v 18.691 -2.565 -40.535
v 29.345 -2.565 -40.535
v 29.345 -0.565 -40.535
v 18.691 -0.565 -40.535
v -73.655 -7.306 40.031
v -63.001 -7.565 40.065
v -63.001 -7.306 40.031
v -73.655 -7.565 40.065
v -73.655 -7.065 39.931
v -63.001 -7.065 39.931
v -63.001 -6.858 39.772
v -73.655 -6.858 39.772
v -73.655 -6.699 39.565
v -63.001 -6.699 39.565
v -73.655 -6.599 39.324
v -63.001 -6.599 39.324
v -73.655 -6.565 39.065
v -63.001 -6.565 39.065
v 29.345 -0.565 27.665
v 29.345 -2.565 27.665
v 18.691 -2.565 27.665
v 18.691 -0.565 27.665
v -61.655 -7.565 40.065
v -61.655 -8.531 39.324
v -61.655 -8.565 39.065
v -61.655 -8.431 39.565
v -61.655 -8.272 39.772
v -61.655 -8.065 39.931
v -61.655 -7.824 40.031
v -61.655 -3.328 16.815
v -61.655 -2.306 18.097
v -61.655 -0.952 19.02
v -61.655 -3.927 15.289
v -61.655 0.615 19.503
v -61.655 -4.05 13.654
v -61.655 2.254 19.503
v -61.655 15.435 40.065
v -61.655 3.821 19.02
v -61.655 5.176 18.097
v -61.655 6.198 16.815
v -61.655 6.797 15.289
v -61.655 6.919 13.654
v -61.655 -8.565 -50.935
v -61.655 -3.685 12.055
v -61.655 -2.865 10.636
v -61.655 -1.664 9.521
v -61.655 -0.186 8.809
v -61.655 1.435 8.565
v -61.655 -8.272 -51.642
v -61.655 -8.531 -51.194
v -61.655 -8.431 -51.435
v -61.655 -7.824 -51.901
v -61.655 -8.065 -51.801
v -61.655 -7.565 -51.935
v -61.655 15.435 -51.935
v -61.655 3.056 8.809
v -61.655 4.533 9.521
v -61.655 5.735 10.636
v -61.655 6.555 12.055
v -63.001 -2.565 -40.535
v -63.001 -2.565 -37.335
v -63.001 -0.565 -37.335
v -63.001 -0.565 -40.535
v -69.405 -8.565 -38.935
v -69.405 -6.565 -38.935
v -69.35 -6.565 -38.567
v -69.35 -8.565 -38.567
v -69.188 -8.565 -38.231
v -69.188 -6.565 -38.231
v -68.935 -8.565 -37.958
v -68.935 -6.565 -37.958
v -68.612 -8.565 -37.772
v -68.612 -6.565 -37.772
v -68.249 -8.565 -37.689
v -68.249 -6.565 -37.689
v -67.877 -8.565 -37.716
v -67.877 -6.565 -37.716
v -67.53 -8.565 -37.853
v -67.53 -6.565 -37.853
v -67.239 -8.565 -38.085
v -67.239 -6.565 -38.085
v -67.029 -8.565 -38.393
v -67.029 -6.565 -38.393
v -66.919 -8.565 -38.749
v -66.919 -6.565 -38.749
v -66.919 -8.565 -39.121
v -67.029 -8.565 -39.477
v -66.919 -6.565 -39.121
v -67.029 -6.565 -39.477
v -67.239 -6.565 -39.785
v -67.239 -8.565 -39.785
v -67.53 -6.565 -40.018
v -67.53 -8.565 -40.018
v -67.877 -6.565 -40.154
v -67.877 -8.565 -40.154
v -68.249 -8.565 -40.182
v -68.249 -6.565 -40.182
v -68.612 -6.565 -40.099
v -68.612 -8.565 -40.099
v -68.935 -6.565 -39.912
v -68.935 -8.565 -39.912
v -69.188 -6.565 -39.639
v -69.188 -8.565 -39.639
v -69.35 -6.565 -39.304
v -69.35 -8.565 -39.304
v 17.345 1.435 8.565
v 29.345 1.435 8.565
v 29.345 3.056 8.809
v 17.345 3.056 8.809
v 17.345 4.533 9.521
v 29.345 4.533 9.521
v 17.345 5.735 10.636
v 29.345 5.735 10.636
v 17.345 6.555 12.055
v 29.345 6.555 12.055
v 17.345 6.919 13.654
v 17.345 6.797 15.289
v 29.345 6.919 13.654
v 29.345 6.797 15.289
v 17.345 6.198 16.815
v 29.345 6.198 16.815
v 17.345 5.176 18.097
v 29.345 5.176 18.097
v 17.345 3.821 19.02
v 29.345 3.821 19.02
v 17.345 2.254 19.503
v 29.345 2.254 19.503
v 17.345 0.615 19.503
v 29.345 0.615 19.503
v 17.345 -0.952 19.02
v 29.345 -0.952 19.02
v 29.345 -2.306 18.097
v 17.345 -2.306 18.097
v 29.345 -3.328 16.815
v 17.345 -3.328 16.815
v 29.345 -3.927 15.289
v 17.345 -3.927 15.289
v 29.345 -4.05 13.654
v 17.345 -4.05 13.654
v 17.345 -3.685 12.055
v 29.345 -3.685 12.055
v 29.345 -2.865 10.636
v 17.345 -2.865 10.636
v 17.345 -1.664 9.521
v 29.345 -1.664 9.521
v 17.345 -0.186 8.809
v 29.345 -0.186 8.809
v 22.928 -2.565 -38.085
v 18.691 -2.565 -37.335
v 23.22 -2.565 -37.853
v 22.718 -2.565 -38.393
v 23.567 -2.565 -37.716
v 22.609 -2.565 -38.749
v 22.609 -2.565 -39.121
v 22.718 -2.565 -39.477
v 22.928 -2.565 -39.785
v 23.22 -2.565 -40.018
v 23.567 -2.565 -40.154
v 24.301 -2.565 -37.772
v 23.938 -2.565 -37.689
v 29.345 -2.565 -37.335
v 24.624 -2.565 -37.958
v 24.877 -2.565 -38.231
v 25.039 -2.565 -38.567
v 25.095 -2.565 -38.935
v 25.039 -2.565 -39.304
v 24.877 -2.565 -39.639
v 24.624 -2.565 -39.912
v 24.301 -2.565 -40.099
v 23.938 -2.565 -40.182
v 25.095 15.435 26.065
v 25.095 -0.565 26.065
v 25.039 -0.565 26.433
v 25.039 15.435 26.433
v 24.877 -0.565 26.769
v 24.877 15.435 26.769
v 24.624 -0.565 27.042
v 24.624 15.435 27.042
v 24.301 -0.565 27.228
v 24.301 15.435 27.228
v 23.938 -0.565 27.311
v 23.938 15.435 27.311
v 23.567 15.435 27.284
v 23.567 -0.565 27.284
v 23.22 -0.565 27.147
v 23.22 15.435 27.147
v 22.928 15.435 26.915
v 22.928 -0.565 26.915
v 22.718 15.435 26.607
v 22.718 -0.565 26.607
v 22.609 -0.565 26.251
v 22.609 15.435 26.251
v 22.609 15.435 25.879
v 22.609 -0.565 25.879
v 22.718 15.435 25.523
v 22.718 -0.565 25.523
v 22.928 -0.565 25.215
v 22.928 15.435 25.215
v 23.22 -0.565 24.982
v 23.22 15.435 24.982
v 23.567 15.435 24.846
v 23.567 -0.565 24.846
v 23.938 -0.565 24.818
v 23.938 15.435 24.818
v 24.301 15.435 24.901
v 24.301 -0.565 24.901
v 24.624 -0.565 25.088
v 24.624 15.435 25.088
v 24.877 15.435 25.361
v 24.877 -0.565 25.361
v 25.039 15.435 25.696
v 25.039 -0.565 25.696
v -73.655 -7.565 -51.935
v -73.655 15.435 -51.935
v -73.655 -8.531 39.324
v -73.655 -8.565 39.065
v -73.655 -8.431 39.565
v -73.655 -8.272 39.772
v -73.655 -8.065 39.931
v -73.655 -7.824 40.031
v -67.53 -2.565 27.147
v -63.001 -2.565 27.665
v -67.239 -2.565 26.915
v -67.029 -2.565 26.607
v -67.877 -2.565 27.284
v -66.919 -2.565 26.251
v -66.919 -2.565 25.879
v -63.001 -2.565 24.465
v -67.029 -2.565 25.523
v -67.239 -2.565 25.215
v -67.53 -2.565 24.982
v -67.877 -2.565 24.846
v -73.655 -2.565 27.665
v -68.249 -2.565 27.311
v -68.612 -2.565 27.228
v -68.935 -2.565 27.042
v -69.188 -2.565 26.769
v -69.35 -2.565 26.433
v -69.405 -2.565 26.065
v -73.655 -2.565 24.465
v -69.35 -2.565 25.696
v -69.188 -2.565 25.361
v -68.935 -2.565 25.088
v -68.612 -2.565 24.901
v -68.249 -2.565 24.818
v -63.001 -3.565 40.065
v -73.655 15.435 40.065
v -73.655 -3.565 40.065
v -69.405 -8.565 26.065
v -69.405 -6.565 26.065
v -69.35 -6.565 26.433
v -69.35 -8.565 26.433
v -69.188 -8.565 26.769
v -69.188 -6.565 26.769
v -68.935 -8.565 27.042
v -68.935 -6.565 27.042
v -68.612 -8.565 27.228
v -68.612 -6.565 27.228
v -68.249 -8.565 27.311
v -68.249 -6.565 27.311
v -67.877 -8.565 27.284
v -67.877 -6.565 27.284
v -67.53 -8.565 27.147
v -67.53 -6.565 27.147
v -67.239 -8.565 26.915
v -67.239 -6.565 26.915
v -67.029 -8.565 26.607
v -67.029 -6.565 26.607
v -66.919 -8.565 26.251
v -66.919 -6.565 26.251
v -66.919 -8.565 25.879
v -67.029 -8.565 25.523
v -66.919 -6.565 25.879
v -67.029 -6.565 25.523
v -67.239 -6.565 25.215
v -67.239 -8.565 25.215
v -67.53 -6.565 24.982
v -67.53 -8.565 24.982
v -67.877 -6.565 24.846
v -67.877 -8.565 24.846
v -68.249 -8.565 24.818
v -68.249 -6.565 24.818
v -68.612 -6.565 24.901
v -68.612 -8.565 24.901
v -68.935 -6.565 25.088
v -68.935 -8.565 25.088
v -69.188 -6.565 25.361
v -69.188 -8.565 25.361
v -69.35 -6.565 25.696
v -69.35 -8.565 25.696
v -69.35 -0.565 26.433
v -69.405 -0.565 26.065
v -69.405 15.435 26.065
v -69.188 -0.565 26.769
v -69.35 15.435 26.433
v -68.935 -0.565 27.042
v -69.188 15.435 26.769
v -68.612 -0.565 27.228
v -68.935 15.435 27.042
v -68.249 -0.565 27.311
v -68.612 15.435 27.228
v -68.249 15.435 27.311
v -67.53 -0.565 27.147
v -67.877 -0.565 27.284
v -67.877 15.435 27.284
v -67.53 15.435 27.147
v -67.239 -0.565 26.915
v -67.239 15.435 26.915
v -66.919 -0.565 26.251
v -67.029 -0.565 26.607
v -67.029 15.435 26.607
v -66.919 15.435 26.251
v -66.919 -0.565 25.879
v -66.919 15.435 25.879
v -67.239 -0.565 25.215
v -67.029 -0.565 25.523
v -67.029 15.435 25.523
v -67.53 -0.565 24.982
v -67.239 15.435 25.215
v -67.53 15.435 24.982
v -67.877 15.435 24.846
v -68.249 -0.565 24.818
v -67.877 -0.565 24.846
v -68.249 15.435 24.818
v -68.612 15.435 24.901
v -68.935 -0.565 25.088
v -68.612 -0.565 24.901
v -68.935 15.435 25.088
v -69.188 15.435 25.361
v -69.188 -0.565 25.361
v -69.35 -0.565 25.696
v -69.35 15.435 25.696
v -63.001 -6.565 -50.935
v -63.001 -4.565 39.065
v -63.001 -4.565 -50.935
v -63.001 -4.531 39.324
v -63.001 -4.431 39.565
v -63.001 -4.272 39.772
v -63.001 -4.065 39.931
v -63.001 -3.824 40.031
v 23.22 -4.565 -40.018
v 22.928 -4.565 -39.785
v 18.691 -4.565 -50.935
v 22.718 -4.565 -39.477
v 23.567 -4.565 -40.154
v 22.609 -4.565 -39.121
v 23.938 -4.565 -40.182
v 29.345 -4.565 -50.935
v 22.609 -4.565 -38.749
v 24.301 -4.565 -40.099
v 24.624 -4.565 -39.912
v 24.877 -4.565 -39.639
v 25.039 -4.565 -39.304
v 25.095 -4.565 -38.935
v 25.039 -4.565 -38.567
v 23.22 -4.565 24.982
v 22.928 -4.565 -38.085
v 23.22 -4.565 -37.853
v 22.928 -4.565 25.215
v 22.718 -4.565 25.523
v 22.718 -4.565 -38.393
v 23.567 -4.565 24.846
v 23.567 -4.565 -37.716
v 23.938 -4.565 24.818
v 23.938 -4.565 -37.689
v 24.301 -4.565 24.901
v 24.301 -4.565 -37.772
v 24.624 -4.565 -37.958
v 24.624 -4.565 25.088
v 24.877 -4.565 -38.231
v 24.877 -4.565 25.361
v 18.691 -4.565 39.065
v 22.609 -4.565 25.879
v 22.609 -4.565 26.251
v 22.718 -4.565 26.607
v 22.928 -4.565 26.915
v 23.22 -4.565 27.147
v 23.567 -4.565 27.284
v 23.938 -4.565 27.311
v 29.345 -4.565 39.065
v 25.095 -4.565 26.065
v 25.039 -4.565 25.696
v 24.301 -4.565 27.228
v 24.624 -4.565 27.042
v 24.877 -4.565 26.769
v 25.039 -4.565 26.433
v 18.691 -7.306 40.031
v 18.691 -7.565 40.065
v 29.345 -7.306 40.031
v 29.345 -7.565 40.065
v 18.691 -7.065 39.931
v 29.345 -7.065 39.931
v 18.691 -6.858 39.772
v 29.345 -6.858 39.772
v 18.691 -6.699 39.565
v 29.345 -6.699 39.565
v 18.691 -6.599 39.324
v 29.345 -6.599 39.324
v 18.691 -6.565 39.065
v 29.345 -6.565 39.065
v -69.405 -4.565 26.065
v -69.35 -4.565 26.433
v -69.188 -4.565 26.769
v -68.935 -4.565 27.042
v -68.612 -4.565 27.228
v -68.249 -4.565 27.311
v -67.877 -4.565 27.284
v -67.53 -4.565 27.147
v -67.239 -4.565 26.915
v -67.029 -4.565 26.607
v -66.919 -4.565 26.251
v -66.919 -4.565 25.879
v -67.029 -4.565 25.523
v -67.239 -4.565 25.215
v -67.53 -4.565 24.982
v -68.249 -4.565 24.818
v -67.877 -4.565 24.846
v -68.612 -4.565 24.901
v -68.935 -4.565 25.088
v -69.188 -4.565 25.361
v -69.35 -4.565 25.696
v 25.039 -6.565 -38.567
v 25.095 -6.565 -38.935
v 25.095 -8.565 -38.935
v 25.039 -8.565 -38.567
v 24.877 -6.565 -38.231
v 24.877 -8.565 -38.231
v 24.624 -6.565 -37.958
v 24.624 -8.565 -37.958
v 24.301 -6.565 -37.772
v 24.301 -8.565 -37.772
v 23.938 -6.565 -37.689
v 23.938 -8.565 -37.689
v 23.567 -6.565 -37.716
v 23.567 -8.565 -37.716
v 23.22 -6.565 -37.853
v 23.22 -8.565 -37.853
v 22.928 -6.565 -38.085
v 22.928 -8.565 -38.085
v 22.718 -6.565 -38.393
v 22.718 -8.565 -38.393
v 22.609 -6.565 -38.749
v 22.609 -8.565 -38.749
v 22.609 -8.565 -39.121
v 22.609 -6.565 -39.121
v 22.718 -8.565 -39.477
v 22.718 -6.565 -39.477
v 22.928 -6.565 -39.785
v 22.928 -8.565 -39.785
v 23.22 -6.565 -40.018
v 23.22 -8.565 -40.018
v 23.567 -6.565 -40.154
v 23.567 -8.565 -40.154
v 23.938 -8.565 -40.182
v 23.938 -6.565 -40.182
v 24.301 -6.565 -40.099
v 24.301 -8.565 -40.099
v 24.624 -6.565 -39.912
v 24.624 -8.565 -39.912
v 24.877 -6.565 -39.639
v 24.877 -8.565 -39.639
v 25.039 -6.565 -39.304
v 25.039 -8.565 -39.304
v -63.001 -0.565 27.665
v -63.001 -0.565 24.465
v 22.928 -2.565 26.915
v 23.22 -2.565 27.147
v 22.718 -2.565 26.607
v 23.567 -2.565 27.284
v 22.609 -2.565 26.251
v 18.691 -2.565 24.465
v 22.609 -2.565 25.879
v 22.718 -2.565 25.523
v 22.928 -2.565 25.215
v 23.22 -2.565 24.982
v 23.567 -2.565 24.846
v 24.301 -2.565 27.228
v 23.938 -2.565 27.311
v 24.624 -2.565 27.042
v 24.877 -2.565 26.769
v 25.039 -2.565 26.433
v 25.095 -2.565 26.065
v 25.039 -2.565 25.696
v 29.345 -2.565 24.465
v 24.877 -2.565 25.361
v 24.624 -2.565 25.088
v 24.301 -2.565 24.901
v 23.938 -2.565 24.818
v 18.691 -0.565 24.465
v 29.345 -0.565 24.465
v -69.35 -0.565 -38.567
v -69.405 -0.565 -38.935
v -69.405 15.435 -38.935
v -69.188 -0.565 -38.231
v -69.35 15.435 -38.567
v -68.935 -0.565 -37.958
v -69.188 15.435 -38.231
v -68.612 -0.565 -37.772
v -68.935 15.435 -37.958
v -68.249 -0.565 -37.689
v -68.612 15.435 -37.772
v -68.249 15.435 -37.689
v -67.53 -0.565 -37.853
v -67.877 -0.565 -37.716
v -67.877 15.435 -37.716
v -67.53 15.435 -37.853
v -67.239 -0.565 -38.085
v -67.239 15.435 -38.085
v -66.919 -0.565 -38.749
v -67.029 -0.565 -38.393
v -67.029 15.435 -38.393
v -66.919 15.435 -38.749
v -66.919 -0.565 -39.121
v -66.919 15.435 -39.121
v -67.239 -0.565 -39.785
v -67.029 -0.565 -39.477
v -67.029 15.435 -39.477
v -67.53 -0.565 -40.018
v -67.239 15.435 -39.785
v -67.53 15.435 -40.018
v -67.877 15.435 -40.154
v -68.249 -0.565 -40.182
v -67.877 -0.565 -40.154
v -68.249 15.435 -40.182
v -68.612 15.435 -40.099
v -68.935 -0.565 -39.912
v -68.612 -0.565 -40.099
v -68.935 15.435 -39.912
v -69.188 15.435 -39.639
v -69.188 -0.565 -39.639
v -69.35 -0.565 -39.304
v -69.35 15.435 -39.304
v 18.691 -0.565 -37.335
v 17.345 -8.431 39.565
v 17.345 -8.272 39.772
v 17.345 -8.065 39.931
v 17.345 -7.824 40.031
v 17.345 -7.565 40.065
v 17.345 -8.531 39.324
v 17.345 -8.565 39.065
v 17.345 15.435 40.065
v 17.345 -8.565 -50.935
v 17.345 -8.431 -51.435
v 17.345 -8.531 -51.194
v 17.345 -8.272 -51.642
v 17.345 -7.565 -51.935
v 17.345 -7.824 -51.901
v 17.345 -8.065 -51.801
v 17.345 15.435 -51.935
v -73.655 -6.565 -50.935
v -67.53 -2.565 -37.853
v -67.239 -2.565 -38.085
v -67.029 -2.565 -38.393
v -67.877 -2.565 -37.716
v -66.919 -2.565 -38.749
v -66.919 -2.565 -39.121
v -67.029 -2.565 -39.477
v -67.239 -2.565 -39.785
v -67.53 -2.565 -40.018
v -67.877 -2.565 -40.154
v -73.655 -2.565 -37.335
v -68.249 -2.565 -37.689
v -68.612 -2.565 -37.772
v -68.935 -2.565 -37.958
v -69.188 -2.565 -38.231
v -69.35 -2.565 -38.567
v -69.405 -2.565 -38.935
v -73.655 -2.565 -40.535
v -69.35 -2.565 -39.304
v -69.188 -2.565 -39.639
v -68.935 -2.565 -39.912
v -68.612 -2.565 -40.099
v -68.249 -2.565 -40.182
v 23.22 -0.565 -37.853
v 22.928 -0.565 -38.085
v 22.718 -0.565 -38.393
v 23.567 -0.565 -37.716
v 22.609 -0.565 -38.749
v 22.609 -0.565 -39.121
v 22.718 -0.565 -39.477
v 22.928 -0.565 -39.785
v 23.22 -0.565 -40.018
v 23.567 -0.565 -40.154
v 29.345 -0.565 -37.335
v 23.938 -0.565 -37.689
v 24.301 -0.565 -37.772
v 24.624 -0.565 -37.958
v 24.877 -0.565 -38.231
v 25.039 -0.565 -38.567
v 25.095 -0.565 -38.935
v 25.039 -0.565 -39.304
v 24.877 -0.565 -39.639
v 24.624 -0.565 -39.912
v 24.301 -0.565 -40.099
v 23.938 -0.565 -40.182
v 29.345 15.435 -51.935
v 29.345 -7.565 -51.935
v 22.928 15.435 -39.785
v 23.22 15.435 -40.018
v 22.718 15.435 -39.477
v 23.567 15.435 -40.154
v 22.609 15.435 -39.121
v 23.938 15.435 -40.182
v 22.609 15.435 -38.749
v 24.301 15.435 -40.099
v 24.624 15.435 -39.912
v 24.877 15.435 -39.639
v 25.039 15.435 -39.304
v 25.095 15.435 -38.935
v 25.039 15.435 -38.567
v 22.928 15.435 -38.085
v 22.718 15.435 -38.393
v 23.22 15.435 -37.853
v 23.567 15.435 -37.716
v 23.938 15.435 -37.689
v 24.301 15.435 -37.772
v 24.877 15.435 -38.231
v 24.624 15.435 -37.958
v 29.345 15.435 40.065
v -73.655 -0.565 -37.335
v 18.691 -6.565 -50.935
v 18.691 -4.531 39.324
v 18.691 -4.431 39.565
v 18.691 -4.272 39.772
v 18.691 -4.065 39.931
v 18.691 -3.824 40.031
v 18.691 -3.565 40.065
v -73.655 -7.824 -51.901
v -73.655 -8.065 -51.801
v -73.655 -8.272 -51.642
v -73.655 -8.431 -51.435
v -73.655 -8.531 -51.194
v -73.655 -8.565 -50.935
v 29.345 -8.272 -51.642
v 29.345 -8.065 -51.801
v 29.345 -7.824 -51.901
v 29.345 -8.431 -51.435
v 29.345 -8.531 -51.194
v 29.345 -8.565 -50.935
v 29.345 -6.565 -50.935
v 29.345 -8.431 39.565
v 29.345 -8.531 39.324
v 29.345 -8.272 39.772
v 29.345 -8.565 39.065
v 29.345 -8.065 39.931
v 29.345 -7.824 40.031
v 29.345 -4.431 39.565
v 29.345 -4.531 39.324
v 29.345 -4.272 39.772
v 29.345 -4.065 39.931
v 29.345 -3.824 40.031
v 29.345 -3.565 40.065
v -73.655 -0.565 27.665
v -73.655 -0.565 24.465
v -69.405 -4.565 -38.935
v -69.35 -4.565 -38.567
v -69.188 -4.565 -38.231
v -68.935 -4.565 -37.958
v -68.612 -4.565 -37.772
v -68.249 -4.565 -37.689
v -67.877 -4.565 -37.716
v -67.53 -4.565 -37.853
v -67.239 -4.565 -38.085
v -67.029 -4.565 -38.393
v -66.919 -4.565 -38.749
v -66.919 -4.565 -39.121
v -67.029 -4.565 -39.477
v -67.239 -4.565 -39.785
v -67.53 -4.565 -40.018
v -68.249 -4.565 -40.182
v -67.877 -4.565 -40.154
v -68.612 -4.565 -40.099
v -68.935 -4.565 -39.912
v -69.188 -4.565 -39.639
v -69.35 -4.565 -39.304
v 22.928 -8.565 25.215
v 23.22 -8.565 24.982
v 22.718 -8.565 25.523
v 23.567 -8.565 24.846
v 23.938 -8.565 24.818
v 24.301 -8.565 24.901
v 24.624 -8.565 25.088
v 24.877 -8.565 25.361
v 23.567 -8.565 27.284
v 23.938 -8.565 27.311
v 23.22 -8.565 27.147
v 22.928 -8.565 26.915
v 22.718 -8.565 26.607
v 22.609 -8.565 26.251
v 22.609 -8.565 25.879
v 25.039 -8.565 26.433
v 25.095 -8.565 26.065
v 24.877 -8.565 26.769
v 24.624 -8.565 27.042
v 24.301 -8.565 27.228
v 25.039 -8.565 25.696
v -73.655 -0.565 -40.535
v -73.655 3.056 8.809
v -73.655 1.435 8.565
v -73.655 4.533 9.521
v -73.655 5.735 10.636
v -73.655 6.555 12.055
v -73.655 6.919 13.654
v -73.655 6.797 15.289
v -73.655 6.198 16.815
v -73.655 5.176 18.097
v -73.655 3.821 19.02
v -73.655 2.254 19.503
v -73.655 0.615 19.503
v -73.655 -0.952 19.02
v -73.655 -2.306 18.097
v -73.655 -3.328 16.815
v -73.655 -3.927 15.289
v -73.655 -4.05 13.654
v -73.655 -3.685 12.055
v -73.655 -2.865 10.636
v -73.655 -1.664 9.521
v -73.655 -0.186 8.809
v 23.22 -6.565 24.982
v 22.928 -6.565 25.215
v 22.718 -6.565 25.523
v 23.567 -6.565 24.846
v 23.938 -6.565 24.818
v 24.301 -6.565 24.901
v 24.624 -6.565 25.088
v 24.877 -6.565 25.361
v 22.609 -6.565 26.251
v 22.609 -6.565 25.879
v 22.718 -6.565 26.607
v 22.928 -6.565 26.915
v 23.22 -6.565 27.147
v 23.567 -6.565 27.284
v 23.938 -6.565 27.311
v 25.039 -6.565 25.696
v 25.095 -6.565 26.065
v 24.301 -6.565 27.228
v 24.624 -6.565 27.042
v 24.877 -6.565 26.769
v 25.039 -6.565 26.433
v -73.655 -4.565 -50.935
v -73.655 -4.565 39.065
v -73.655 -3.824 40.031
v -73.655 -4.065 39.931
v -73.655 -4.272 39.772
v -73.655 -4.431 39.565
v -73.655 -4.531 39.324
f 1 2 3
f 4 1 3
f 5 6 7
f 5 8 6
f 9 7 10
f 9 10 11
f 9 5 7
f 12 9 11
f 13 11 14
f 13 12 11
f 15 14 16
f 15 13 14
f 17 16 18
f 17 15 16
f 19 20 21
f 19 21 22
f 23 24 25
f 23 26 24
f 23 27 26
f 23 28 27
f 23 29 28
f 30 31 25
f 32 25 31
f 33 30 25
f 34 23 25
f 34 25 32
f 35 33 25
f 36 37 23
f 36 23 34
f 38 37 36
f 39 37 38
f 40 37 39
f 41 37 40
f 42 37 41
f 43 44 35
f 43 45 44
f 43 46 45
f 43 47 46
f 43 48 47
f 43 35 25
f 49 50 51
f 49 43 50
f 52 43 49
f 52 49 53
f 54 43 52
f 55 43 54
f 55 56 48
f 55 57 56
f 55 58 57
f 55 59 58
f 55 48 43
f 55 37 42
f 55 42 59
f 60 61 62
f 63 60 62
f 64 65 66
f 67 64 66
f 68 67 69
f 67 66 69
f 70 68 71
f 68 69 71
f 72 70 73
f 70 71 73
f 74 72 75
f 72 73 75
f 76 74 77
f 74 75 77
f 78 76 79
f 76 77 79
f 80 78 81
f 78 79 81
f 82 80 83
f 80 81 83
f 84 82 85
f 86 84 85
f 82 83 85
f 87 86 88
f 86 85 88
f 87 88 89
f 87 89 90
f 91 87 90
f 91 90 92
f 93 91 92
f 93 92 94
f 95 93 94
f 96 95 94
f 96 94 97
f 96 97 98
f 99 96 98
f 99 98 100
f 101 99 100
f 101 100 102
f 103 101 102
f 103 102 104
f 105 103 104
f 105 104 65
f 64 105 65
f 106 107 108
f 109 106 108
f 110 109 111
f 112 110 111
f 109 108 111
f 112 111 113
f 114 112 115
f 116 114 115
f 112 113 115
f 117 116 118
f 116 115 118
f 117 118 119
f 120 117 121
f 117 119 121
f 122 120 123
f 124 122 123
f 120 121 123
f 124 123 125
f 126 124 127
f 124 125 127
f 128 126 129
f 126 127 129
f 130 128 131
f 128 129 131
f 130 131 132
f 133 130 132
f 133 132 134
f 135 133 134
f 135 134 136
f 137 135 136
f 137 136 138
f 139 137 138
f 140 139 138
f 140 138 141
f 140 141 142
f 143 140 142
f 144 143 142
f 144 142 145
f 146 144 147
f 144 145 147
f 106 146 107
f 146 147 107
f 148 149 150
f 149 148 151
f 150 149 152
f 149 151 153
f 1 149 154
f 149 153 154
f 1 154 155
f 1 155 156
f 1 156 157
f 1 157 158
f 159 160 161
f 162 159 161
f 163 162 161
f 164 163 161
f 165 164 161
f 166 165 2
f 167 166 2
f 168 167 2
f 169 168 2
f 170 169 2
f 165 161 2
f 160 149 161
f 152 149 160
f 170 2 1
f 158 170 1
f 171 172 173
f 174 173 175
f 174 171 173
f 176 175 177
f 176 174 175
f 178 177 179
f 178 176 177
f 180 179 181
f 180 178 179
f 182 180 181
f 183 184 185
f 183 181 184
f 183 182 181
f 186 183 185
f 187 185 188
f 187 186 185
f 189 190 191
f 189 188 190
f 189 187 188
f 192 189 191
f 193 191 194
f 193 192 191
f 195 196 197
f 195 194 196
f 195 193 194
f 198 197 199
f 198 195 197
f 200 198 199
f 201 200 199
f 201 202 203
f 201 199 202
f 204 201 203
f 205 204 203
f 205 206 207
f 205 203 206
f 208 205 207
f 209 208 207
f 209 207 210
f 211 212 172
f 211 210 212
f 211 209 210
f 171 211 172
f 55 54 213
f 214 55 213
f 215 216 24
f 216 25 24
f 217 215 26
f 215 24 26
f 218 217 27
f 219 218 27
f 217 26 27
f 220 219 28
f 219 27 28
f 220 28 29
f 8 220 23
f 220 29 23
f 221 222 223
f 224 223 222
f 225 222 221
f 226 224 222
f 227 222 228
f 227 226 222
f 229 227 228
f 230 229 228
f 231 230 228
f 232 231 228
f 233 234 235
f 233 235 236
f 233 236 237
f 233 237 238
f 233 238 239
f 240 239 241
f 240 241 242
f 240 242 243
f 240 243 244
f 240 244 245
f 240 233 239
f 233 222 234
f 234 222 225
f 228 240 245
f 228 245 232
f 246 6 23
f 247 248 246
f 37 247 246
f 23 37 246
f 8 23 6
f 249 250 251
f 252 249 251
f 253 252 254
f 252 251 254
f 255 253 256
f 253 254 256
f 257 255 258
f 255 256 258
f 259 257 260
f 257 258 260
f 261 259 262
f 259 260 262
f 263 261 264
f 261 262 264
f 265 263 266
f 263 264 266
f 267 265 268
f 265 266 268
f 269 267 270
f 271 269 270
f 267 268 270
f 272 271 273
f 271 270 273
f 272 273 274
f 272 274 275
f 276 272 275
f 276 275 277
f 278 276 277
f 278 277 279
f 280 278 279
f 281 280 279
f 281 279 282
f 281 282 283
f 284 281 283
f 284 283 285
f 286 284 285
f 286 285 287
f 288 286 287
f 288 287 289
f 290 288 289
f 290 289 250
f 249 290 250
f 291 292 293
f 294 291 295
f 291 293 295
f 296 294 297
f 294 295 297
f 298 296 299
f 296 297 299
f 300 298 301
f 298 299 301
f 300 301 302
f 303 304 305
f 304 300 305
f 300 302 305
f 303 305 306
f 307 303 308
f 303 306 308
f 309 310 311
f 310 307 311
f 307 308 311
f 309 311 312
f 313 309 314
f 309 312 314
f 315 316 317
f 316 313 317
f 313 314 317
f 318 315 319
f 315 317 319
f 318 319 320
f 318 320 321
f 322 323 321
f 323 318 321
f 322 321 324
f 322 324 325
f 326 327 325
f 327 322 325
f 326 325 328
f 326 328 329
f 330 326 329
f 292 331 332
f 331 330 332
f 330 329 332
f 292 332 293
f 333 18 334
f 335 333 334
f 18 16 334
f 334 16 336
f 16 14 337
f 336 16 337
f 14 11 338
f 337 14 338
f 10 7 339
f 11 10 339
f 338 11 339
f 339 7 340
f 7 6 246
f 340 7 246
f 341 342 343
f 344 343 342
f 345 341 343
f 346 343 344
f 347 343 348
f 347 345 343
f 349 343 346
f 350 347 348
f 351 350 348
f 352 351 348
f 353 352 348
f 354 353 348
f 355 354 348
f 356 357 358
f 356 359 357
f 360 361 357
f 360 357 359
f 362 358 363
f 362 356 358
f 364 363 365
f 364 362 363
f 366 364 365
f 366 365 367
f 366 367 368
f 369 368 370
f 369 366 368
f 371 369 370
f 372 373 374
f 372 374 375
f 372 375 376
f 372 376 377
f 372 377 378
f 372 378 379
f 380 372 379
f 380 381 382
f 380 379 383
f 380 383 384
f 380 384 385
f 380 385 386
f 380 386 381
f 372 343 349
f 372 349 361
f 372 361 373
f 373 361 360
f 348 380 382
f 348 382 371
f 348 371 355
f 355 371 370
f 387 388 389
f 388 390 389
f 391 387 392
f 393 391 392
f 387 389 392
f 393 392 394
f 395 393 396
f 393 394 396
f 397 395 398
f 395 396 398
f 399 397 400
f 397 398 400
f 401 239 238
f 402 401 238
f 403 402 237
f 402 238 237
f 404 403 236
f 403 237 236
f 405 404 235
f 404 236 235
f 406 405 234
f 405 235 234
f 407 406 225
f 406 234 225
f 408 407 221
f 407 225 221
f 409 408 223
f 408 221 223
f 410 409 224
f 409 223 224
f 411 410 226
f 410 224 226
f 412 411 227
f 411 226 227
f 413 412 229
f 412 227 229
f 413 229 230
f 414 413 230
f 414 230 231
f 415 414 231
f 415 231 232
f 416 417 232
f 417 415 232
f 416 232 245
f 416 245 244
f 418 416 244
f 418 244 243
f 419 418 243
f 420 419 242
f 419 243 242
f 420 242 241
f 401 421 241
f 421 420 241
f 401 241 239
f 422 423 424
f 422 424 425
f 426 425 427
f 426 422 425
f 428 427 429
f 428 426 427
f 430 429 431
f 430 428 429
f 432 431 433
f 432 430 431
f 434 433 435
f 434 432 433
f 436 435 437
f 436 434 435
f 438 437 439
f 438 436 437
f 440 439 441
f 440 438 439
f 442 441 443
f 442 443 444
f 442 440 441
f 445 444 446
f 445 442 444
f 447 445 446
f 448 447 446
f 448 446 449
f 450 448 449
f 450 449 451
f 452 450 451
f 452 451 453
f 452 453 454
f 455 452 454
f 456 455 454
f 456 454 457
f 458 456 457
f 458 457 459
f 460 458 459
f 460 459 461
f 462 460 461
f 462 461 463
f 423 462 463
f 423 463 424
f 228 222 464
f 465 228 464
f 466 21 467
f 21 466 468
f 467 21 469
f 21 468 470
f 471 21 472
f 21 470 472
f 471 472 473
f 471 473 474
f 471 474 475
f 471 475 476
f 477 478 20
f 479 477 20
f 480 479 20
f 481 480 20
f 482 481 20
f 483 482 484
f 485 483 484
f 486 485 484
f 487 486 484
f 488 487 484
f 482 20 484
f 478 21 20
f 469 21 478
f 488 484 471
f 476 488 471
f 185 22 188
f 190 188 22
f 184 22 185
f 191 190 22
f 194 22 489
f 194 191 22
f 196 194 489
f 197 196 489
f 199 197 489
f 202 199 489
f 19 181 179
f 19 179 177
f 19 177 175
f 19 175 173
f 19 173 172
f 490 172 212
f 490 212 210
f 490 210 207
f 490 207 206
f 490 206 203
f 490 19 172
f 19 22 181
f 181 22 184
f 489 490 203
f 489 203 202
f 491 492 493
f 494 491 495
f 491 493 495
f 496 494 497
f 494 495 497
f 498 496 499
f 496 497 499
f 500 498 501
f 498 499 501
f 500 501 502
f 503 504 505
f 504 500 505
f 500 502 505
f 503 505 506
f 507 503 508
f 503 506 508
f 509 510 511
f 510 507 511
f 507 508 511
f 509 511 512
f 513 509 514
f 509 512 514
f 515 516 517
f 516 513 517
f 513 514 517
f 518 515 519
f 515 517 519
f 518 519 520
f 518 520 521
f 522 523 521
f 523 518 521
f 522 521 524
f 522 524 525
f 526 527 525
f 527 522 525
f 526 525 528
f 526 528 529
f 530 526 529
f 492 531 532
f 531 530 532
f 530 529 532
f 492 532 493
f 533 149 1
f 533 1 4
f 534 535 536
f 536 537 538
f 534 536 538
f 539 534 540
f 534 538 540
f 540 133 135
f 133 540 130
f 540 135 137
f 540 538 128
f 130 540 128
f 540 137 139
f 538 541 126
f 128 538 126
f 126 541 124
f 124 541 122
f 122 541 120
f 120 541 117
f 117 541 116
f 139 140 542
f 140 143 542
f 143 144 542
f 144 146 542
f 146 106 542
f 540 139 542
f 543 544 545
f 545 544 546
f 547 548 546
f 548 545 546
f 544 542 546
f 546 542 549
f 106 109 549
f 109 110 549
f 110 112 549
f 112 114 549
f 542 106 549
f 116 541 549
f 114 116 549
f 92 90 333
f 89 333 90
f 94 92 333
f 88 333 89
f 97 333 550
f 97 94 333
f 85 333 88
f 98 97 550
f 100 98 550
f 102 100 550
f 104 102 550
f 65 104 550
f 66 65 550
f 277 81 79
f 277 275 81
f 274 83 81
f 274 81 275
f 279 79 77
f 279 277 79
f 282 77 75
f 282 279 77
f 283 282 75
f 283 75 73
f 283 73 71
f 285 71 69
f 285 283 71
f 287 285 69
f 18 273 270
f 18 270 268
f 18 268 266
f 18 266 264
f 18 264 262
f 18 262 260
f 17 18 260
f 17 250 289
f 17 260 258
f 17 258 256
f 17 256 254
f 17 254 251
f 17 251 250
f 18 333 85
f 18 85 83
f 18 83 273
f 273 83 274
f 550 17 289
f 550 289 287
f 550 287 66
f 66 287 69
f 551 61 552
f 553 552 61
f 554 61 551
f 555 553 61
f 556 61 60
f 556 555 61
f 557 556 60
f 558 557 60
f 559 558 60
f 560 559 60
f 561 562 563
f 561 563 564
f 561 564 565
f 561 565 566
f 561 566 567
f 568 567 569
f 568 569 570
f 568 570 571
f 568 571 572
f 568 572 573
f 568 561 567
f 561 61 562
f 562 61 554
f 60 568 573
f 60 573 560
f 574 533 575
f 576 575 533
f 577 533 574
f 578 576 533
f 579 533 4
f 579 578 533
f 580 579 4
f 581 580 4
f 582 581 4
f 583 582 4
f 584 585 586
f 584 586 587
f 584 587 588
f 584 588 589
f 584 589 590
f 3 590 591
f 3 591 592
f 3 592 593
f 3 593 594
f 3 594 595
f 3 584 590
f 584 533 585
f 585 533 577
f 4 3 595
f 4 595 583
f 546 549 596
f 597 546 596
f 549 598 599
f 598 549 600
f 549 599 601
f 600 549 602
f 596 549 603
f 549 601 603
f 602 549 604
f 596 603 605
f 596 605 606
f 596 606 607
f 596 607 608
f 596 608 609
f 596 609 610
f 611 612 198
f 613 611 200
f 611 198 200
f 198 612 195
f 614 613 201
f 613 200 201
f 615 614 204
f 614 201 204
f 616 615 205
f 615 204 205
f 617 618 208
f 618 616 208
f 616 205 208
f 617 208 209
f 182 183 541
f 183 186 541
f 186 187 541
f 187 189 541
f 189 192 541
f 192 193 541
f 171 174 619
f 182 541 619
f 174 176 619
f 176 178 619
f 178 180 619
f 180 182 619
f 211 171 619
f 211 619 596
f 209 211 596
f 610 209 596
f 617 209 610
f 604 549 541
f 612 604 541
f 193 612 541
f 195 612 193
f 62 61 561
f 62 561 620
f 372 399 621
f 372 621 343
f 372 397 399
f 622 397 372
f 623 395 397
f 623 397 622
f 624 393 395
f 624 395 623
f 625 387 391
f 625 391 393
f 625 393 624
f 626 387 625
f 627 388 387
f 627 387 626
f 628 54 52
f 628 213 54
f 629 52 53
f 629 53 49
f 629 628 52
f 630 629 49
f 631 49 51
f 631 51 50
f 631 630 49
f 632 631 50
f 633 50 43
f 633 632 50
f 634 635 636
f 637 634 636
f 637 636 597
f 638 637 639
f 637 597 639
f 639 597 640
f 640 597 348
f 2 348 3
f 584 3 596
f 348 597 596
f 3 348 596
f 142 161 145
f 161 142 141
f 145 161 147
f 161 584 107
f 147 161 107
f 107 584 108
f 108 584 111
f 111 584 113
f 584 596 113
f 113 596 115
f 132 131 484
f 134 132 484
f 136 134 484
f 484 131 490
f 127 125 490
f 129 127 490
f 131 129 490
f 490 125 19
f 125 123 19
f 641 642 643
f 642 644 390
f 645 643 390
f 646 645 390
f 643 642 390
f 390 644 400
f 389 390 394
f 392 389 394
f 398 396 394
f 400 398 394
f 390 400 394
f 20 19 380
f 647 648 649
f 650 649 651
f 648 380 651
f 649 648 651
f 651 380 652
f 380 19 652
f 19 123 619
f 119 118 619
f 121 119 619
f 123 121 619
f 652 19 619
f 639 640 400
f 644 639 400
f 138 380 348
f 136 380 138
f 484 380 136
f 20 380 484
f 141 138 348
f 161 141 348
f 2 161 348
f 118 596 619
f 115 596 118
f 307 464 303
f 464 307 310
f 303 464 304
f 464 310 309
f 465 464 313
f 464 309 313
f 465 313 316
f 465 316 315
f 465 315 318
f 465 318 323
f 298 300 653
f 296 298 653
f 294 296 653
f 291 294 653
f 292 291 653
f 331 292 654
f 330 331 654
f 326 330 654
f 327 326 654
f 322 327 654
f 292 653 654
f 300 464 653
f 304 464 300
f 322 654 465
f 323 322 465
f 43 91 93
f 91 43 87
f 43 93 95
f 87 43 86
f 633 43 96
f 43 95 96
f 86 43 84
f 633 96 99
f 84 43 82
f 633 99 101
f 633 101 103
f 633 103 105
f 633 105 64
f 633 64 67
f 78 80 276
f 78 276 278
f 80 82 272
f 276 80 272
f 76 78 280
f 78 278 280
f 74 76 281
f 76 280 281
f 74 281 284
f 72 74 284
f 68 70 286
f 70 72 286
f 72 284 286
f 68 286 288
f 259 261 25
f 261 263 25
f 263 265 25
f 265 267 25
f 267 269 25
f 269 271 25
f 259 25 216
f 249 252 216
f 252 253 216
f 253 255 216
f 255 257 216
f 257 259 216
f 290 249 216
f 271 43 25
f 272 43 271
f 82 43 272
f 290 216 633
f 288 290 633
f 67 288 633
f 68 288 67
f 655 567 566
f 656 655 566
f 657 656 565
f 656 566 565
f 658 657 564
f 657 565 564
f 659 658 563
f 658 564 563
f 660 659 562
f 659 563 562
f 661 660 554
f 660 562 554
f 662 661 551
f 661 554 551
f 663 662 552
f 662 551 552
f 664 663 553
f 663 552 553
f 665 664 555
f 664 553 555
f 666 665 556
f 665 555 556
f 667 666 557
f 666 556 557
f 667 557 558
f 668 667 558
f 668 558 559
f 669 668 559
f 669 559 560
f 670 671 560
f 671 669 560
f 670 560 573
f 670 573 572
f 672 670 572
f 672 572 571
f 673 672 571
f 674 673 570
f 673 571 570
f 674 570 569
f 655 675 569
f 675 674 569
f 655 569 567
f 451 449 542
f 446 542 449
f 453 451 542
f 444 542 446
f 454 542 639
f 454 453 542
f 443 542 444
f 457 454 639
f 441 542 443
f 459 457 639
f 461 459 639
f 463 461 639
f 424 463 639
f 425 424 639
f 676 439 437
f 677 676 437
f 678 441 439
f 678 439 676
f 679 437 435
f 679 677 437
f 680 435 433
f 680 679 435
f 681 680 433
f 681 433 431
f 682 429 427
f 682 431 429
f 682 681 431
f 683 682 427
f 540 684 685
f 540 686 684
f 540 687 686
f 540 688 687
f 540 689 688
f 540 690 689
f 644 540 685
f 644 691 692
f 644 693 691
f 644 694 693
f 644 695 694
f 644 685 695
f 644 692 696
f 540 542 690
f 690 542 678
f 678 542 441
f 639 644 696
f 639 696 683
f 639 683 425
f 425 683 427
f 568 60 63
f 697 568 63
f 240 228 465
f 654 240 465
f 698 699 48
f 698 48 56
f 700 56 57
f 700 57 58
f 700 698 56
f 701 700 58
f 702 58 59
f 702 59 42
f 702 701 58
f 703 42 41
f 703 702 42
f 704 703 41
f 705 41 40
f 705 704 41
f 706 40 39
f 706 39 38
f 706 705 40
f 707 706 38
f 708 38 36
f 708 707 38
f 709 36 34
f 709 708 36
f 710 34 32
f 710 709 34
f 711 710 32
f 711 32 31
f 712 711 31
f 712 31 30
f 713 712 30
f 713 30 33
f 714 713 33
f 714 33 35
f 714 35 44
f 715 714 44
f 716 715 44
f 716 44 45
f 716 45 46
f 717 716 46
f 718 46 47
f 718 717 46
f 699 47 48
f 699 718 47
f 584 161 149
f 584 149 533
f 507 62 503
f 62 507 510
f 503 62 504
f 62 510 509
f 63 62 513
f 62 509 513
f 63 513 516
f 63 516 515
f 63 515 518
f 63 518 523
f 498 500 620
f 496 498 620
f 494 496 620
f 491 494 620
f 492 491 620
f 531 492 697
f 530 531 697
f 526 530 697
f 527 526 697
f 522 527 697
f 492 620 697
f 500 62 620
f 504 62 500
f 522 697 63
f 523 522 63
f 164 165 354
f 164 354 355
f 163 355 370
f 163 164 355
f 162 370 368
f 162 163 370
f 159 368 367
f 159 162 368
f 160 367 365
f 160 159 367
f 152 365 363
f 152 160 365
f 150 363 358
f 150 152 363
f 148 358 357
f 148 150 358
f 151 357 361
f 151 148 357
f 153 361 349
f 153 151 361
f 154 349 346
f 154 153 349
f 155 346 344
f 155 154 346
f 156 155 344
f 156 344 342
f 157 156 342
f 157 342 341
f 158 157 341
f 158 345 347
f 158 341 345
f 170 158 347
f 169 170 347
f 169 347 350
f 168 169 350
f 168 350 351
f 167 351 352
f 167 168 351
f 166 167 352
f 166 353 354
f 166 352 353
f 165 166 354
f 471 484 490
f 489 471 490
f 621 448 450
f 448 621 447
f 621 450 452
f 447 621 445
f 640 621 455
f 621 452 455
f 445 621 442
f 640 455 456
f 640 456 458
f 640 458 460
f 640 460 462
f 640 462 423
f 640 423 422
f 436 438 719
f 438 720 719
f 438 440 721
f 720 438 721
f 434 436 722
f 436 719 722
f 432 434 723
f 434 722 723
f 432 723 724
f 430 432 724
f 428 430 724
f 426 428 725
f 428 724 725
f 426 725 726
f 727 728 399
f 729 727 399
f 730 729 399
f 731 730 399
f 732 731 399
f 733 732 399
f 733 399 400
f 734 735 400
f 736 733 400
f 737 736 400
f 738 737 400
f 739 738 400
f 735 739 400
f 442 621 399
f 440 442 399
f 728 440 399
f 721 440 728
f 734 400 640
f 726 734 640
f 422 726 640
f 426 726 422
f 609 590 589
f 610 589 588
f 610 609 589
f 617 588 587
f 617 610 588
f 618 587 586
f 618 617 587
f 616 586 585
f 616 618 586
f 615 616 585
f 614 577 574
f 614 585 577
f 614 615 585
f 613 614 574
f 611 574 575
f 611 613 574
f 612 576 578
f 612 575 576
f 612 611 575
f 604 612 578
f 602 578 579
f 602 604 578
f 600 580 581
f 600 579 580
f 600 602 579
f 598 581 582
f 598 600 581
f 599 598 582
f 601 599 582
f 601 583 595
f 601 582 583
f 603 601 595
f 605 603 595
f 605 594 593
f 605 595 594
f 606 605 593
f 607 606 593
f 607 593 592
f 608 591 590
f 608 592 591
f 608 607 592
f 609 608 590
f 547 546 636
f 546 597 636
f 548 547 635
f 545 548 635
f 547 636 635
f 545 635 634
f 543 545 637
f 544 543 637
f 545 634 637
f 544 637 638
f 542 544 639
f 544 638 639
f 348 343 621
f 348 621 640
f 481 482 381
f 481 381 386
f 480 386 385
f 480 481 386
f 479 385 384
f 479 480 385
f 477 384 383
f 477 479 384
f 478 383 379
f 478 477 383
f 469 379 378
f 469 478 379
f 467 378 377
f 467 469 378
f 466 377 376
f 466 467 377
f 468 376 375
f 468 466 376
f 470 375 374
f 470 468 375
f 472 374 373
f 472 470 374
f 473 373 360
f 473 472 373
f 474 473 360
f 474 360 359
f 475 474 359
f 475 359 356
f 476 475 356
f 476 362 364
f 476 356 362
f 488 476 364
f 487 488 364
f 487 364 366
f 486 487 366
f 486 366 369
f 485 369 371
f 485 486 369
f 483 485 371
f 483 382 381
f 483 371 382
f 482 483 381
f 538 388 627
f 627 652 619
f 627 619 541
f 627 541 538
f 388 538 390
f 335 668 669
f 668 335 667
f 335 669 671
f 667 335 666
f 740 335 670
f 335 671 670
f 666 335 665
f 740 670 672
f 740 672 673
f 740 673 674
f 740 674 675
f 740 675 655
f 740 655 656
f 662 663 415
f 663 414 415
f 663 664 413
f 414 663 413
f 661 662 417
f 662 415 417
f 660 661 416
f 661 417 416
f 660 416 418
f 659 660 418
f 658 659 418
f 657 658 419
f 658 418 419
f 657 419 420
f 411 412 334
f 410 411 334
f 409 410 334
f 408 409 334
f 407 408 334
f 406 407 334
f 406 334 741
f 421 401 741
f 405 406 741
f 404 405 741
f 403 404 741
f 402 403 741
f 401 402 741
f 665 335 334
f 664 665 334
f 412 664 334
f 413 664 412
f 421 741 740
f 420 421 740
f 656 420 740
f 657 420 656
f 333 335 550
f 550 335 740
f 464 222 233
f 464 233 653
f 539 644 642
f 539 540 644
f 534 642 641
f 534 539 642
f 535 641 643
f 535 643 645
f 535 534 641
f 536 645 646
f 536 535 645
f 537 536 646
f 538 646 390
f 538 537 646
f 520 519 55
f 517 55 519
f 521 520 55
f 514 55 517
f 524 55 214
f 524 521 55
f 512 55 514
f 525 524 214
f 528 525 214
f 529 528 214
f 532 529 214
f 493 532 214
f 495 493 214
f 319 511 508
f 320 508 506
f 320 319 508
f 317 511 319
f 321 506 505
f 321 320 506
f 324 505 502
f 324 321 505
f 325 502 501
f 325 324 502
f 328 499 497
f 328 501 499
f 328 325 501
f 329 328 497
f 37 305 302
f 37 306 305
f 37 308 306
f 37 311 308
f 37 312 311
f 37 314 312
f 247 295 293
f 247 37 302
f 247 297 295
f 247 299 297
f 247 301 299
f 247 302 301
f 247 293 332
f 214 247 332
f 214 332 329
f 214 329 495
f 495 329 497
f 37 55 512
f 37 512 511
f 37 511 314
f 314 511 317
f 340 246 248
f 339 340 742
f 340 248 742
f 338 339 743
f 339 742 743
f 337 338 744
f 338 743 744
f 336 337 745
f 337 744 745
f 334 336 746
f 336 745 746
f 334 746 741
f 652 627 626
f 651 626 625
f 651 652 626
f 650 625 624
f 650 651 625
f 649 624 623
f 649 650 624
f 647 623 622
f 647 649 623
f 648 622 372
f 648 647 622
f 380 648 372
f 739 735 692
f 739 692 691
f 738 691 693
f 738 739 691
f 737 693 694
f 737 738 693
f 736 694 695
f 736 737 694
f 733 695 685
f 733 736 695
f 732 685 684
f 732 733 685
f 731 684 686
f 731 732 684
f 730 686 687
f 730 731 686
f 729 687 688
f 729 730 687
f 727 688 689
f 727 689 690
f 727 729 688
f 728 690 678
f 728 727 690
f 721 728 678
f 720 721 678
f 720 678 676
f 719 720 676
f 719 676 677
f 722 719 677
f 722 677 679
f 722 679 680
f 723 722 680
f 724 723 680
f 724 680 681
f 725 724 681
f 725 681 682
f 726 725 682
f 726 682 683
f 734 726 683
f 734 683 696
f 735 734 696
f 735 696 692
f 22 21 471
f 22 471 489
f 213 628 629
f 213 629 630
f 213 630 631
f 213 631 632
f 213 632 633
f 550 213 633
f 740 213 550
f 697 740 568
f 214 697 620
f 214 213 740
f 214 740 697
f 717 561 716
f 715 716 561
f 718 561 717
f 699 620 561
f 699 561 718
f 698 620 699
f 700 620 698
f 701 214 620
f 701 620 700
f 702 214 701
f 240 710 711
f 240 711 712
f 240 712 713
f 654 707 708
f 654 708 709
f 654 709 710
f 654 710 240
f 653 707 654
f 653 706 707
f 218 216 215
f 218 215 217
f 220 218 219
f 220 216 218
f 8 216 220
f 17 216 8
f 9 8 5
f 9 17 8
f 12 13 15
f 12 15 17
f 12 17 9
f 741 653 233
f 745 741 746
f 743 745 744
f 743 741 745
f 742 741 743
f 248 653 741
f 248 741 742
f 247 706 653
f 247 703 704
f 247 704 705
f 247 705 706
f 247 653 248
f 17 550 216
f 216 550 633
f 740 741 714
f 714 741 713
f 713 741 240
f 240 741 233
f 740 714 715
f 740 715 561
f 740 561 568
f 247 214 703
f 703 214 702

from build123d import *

# Parameters (mm, degrees)
SKETCH3_R           = 1.25
BOSS_EXTRUDE1_DEPTH = 24
SKETCH6_W           = 10.653986256
SKETCH6_H           = 2
CUT_EXTRUDE1_DEPTH  = 91
CUT_EXTRUDE3_REACH  = 57.493
SKETCH7_W           = 3.2
SKETCH7_H           = 2
FILLET1_R           = 1
SKETCH8_R           = 5.5
CUT_EXTRUDE4_DEPTH  = 12


with BuildPart() as part:
    # Sketch3 → Boss-Extrude1 (new body)
    with BuildSketch(Plane.XZ.offset(-15.434699117)):
        Polygon((17.344683291, 34.064867032), (17.344683291, -45.935132968), (17.344683291, -51.935132968), (29.344683291, -51.935132968), (29.344683291, -45.935132968), (29.344683291, 34.064867032), (29.344683291, 40.064867032), (17.344683291, 40.064867032), align=None)
        with Locations((23.844683291, -38.935132968)):
            Circle(SKETCH3_R, mode=Mode.SUBTRACT)
        with Locations((23.844683291, 26.064867032)):
            Circle(SKETCH3_R, mode=Mode.SUBTRACT)
    extrude(amount=BOSS_EXTRUDE1_DEPTH)

    # Sketch6 → Cut-Extrude1 (cut)
    with BuildSketch(Plane.XY.offset(40.064867032)):
        with Locations((24.017690163, -5.565300883)):
            Rectangle(SKETCH6_W, SKETCH6_H)
    extrude(amount=-CUT_EXTRUDE1_DEPTH, mode=Mode.SUBTRACT)

    # Cut-Extrude3: up to this face of the body (flat: up to its plane)
    cut_extrude3_end = Plane(part.part.faces().sort_by_distance((18.690697035, -5.565300883, -5.435132968))[0])
    # Sketch7 → Cut-Extrude3 (cut, up to the picked face)
    with BuildSketch(Plane(origin=(29.344683291, 0, 0), x_dir=(0, 0, -1), z_dir=(1, 0, 0)), mode=Mode.PRIVATE) as cut_extrude3_sk1:
        with Locations((-26.064867032, -1.565300883)):
            Rectangle(SKETCH7_W, SKETCH7_H)
    cut_extrude3_tool1 = split(extrude(cut_extrude3_sk1.sketch, amount=-CUT_EXTRUDE3_REACH, mode=Mode.PRIVATE), bisect_by=cut_extrude3_end, keep=Keep.BOTH, mode=Mode.PRIVATE)
    # Sketch7 → Cut-Extrude3 (cut, up to the picked face)
    with BuildSketch(Plane(origin=(29.344683291, 0, 0), x_dir=(0, 0, -1), z_dir=(1, 0, 0)), mode=Mode.PRIVATE) as cut_extrude3_sk2:
        with Locations((38.935132968, -1.565300883)):
            Rectangle(SKETCH7_W, SKETCH7_H)
    cut_extrude3_tool2 = split(extrude(cut_extrude3_sk2.sketch, amount=-CUT_EXTRUDE3_REACH, mode=Mode.PRIVATE), bisect_by=cut_extrude3_end, keep=Keep.BOTH, mode=Mode.PRIVATE)
    add(cut_extrude3_tool1.solids().sort_by(Axis((29.344683, -1.565301, 26.064867), (-1, 0, 0)))[0], mode=Mode.SUBTRACT)
    add(cut_extrude3_tool2.solids().sort_by(Axis((29.344683, -1.565301, -38.935133), (-1, 0, 0)))[0], mode=Mode.SUBTRACT)

    # Fillet1
    fillet1_edges = [part.edges().sort_by_distance(p)[0] for p in [
        (23.344683291, -8.565300883, -51.935132968),
        (23.344683291, -8.565300883, 40.064867032),
        (24.017690163, -6.565300883, 40.064867032),
        (24.017690163, -4.565300883, 40.064867032),
    ]]
    fillet(fillet1_edges, radius=FILLET1_R - 0.0001)  # a hair under: the kernel refuses the full size

    # Sketch8 → Cut-Extrude4 (cut)
    with BuildSketch(Plane(origin=(29.344683291, 0, 0), x_dir=(0, 0, -1), z_dir=(1, 0, 0))):
        with Locations((-14.064867032, 1.434699117)):
            Circle(SKETCH8_R)
    extrude(amount=-CUT_EXTRUDE4_DEPTH, mode=Mode.SUBTRACT)


with BuildPart() as body_2:
    # Mirror4: mirrored copy
    add(part.part.mirror(Plane.ZY.offset(22.155316709)))


solid = Compound([part.part, body_2.part])
